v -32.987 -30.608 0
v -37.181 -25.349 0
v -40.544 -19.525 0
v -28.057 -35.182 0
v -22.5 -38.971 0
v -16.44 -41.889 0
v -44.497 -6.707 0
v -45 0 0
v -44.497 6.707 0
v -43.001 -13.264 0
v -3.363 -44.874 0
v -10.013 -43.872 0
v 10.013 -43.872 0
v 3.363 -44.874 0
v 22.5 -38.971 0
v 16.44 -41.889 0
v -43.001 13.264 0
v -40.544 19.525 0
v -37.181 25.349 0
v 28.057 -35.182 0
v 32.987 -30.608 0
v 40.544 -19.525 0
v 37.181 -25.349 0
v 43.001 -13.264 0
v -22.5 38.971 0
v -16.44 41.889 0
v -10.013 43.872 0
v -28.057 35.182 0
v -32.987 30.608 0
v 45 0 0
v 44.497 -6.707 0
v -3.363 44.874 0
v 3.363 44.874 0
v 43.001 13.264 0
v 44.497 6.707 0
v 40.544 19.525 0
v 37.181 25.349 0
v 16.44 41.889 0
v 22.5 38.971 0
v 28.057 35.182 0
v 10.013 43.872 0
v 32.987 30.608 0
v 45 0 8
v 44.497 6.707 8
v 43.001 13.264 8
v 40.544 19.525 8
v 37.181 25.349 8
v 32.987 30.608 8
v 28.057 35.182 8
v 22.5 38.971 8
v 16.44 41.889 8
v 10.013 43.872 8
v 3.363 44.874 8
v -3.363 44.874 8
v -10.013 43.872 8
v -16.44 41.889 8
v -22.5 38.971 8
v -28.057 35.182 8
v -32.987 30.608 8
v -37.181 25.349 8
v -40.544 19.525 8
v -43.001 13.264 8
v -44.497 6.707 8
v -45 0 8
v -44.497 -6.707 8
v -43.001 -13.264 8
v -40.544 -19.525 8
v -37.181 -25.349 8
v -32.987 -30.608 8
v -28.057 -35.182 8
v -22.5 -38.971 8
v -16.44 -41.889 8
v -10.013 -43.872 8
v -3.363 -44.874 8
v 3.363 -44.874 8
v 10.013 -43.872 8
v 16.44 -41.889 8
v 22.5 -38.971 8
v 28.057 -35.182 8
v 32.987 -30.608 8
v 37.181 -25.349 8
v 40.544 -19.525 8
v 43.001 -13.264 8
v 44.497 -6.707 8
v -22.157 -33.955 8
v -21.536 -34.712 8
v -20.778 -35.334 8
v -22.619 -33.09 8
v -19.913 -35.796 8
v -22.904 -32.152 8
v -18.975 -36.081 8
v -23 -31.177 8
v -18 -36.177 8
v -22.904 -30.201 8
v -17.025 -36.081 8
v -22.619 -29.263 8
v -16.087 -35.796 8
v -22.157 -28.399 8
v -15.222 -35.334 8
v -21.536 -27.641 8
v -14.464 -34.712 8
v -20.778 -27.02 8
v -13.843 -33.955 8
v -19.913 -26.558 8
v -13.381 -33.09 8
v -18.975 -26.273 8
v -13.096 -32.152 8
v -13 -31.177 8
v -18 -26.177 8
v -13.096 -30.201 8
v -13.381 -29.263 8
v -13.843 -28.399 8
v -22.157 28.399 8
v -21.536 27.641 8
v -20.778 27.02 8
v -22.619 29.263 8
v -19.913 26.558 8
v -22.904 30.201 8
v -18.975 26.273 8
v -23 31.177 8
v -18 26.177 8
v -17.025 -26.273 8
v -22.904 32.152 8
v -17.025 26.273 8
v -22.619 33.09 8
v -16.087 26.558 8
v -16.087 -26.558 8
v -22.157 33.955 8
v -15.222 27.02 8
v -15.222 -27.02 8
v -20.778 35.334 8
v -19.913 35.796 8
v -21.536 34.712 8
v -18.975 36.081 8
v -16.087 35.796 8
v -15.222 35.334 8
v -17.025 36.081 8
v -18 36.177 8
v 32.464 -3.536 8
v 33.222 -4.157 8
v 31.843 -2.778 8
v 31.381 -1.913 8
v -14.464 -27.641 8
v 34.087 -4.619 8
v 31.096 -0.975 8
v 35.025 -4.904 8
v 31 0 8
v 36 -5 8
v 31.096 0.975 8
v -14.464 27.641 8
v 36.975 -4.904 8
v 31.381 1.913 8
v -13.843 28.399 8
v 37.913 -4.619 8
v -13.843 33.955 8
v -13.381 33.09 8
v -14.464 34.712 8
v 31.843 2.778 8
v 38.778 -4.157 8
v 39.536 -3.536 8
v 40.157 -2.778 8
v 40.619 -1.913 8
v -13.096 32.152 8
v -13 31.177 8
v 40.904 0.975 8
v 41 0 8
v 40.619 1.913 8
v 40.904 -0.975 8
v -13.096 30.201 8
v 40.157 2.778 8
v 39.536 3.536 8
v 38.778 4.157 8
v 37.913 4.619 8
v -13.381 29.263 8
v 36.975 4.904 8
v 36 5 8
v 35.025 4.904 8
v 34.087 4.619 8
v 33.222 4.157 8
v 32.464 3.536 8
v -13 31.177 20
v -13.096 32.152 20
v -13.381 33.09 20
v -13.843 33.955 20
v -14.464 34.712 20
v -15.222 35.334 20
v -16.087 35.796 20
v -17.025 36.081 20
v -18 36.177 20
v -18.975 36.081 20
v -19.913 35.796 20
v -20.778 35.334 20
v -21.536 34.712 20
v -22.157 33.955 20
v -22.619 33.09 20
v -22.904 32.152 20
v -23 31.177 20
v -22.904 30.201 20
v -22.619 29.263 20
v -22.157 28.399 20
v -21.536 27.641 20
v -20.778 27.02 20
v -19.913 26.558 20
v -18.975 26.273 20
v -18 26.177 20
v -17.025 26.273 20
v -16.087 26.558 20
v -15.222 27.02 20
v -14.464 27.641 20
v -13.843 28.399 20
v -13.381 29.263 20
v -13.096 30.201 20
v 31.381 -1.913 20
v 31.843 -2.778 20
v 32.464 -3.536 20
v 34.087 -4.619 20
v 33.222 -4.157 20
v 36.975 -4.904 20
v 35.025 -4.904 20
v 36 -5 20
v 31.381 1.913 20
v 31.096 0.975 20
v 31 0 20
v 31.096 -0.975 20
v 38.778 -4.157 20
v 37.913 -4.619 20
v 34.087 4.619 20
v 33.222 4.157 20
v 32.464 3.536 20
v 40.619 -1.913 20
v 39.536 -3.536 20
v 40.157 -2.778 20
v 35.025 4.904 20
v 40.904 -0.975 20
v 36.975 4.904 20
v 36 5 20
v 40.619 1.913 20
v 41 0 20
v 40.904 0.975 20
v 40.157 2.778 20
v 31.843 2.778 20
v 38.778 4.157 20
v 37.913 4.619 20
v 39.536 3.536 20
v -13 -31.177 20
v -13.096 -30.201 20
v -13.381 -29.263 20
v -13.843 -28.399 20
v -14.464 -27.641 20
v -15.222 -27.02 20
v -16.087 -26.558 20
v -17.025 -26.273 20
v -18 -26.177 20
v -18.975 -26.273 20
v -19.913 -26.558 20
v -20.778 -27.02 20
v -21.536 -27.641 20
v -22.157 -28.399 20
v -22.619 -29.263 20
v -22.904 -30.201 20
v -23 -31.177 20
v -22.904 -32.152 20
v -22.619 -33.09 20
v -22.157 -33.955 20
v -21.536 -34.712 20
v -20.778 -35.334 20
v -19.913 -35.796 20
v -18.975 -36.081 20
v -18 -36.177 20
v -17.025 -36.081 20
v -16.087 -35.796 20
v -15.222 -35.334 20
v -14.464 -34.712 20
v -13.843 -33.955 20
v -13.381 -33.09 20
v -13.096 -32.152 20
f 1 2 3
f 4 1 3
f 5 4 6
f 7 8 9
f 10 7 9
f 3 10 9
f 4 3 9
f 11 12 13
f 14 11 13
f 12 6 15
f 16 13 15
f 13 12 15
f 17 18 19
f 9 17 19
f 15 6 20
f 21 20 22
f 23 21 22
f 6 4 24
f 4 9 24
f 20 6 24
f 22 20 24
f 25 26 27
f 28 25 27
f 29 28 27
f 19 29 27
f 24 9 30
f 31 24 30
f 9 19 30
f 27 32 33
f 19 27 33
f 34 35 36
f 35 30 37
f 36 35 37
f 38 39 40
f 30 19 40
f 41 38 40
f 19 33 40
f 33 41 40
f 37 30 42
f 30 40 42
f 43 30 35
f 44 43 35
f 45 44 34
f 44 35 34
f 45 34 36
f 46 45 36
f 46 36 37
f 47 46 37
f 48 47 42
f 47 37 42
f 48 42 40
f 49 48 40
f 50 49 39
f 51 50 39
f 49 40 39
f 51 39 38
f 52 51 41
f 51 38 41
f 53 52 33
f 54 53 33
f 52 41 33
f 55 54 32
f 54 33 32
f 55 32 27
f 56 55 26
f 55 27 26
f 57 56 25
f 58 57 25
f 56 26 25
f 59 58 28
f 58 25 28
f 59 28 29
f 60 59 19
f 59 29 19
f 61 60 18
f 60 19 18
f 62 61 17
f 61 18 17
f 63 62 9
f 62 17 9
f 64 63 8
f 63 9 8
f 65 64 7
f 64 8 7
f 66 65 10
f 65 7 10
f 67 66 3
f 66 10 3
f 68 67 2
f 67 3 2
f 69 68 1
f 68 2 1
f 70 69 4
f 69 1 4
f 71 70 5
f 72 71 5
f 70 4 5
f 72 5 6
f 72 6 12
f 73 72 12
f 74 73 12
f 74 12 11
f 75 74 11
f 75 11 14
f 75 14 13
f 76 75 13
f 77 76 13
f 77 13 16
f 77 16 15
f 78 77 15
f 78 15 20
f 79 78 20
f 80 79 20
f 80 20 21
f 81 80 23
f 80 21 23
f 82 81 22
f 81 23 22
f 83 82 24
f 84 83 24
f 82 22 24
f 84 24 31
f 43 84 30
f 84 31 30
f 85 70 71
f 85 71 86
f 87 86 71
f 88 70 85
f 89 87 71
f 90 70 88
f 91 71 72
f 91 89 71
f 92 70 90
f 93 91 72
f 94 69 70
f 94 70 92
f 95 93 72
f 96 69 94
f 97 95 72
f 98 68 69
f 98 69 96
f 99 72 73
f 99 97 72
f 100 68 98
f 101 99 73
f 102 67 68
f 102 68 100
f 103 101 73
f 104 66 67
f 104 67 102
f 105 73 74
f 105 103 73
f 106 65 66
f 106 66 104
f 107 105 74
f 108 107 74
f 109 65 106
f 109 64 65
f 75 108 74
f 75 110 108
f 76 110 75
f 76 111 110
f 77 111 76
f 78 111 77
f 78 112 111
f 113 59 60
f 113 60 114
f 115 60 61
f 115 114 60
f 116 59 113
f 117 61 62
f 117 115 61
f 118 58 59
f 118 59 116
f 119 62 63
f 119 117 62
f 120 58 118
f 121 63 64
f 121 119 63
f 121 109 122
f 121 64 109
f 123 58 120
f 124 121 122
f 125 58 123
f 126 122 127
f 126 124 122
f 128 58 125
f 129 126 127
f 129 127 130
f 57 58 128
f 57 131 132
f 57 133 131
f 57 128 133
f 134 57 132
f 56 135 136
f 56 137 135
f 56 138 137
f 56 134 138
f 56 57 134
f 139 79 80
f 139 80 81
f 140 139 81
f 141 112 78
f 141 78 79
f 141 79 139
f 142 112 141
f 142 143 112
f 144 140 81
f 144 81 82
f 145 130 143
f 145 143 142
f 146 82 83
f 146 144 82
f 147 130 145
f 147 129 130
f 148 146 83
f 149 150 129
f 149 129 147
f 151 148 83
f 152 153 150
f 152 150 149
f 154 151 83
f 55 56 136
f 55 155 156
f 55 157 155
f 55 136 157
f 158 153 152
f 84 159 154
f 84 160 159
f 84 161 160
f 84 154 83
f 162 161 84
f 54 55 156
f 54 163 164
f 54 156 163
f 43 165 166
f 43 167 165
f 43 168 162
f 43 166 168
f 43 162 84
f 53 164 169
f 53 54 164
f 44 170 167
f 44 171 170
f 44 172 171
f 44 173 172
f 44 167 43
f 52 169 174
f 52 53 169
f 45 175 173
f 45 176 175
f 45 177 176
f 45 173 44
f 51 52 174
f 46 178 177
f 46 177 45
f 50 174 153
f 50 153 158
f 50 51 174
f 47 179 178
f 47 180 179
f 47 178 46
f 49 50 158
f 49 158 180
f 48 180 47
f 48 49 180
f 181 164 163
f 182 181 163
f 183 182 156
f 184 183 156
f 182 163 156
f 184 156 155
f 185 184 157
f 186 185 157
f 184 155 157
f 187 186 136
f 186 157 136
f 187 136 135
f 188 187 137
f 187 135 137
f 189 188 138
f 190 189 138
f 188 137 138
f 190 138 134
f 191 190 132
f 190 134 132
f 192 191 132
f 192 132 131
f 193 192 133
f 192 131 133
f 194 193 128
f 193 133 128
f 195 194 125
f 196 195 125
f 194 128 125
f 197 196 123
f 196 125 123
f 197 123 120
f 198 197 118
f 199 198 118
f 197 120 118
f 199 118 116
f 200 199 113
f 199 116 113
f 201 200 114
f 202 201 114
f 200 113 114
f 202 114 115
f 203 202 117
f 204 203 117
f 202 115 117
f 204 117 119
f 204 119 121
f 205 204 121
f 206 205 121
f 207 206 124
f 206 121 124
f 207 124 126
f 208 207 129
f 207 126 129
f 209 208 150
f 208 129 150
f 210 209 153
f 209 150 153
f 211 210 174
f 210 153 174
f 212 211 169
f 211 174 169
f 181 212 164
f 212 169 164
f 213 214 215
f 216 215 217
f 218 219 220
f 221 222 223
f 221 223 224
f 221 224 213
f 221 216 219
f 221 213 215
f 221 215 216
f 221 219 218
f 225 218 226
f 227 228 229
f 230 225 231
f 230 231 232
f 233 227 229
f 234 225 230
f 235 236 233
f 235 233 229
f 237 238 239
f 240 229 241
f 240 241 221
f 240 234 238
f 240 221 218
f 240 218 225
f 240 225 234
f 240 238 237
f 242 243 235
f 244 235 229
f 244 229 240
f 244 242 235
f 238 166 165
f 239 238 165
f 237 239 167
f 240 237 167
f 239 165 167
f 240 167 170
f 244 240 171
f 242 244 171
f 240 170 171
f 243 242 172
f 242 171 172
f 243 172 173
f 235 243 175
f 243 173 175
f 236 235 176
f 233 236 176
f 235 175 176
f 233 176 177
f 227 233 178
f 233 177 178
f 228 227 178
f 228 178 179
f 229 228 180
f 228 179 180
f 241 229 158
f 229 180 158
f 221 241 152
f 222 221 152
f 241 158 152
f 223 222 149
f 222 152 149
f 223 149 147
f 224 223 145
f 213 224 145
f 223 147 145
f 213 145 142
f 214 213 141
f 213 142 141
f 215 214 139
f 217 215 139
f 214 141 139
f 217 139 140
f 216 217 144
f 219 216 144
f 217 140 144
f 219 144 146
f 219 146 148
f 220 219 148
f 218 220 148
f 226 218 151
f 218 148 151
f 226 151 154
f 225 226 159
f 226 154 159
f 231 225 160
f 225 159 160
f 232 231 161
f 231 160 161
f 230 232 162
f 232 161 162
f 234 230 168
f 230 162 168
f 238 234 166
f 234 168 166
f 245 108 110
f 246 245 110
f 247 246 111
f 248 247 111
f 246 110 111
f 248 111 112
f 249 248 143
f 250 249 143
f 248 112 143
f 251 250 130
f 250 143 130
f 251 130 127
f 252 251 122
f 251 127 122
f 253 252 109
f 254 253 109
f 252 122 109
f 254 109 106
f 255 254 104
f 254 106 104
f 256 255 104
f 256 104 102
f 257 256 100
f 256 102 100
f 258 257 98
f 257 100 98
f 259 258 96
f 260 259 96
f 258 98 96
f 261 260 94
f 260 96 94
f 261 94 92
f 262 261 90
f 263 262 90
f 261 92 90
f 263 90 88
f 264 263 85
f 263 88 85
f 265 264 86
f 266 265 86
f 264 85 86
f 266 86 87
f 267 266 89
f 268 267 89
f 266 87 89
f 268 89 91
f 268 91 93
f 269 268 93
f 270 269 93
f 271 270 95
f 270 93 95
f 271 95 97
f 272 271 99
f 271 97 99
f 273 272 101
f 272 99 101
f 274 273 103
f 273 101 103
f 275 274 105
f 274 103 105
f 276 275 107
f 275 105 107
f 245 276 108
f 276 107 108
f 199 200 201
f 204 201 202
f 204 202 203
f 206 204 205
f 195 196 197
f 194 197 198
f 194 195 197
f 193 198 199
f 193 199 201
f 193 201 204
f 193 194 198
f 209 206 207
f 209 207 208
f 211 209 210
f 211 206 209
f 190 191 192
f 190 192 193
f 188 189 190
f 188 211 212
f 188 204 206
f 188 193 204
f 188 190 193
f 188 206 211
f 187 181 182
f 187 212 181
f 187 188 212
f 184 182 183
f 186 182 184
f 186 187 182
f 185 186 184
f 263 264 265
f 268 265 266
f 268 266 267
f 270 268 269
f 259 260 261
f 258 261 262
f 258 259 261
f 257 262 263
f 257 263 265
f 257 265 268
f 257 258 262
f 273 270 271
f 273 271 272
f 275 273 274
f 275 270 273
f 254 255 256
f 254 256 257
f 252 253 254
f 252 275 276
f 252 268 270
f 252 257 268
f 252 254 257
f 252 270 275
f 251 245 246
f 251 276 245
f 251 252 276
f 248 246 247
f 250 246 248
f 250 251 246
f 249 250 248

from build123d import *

# Parameters (mm, degrees)
SKETCH1_R           = 45
BOSS_EXTRUDE1_DEPTH = 8
SKETCH2_R           = 5
BOSS_EXTRUDE2_DEPTH = 12


with BuildPart() as part:
    # Sketch1 → Boss-Extrude1 (new body)
    with BuildSketch(Plane.XY):
        Circle(SKETCH1_R)
    extrude(amount=BOSS_EXTRUDE1_DEPTH)

    # Sketch2 → Boss-Extrude2 (add)
    with BuildSketch(Plane.XY.offset(8)):
        with Locations((36, 0)):
            Circle(SKETCH2_R)
        with Locations((-18, 31.176914536)):
            Circle(SKETCH2_R)
        with Locations((-18, -31.176914536)):
            Circle(SKETCH2_R)
    extrude(amount=BOSS_EXTRUDE2_DEPTH)


solid = part.part
